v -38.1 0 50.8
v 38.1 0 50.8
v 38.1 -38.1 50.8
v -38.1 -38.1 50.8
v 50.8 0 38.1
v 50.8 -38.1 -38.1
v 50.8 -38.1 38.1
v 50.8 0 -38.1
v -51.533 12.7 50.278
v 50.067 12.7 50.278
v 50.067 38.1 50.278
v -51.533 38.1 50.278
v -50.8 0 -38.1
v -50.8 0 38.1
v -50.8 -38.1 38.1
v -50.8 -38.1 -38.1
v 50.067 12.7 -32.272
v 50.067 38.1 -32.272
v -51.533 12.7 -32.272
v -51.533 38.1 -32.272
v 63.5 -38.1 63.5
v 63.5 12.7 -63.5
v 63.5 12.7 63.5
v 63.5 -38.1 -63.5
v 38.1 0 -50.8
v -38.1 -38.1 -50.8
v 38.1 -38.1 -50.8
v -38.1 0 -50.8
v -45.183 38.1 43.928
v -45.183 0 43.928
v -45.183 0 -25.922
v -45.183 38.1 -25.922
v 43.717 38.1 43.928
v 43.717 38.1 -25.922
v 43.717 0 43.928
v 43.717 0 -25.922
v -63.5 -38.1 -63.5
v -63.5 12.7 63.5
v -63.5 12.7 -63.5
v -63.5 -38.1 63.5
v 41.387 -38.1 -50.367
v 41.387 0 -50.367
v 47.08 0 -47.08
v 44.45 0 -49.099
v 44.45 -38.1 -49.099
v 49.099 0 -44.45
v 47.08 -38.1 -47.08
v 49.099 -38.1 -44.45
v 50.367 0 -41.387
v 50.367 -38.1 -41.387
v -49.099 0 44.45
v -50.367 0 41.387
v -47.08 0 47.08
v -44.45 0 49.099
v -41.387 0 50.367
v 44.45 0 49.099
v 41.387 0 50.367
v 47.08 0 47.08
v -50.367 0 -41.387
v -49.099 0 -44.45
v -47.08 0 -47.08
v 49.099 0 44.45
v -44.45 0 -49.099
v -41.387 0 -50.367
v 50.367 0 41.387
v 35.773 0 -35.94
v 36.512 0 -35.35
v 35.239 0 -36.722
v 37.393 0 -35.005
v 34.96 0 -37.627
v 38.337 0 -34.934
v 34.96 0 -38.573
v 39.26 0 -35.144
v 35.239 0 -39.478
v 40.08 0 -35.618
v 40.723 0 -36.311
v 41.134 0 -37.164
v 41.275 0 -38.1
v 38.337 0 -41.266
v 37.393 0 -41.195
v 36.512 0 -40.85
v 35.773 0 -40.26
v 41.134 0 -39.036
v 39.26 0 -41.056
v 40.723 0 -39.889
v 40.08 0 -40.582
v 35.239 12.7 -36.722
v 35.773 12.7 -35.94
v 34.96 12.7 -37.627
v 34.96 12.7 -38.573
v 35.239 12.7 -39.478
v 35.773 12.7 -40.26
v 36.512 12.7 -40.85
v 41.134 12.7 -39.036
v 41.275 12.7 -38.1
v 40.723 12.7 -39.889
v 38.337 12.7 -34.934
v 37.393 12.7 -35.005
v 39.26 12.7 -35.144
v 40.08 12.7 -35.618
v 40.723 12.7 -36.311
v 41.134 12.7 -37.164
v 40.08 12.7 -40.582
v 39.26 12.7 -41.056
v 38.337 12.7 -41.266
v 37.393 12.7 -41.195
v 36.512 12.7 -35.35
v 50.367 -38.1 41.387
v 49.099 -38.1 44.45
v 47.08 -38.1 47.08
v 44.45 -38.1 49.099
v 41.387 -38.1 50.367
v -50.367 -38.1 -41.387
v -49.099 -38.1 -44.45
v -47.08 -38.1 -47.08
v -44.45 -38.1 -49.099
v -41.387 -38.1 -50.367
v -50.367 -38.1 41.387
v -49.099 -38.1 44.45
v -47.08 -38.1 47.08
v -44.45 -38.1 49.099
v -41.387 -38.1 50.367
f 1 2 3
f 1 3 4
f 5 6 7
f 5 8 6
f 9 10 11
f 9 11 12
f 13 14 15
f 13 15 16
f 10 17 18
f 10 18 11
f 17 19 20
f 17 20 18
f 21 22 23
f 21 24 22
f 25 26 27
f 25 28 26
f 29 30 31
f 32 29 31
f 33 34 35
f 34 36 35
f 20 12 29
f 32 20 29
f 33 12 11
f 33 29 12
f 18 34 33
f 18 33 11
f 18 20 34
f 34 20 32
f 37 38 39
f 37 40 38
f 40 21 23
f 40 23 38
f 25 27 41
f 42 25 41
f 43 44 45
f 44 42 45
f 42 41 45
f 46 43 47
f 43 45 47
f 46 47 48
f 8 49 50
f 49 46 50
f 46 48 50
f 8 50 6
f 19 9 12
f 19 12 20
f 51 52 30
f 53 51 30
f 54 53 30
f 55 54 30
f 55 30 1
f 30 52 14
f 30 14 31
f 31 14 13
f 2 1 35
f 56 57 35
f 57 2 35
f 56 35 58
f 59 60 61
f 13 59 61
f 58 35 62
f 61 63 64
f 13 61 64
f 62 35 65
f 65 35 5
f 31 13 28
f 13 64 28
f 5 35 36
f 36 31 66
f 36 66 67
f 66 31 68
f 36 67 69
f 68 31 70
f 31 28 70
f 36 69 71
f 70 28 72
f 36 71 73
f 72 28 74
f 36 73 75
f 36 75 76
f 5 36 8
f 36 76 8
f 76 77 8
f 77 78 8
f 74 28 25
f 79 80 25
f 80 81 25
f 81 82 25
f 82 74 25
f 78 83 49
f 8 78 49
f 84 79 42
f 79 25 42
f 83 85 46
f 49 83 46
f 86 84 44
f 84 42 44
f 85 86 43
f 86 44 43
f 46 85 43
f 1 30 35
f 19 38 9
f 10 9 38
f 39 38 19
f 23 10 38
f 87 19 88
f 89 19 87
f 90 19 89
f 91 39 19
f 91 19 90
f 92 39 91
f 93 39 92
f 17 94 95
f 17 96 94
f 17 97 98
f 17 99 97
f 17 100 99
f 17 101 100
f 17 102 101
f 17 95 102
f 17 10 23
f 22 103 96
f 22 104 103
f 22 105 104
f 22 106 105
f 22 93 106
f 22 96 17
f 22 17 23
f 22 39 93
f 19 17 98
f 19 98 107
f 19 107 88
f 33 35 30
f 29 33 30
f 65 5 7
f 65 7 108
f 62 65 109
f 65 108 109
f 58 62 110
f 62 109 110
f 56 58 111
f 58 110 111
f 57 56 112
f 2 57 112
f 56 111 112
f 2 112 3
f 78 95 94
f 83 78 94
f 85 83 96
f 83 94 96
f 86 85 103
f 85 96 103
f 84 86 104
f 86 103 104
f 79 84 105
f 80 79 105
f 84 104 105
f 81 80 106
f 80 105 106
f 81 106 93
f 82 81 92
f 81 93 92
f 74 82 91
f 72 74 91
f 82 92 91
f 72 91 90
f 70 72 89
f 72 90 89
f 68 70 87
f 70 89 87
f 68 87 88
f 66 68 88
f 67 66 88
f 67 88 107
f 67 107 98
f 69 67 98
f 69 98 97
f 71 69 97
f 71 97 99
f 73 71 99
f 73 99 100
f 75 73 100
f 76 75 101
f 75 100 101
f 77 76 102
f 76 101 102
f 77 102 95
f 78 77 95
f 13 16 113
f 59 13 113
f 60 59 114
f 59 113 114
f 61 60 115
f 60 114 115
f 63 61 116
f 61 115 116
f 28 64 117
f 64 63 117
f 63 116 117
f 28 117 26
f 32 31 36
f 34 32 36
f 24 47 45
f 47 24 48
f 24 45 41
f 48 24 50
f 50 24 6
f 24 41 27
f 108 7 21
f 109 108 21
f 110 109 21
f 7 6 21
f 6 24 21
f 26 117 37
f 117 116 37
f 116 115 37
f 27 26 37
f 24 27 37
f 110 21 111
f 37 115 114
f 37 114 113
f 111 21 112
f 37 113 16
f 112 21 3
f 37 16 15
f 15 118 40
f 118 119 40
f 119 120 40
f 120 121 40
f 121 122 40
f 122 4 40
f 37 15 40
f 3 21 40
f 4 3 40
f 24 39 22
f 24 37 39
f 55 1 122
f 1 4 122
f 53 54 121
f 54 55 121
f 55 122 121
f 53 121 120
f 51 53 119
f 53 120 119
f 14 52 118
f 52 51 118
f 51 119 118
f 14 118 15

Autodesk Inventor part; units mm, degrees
ref_plane "YZ Plane" through (0, 0, 0) normal (1, 0, 0) x (0, 1, 0)
ref_plane "XZ Plane" through (0, 0, 0) normal (0, 1, 0) x (-1, 0, 0)
ref_plane "XY Plane" through (0, 0, 0) normal (0, 0, 1) x (1, 0, 0)
sketch "Sketch1" plane through (0, 0, 0) normal (0, 1, 0) x (-1, 0, 0)
  line L0 (-50.8, 50.8) -> (50.8, 50.8)
  line L1 (50.8, 50.8) -> (50.8, -50.8)
  line L2 (50.8, -50.8) -> (-50.8, -50.8)
  line L3 (-50.8, -50.8) -> (-50.8, 50.8)
  line L4 (-63.5, 63.5) -> (63.5, 63.5)
  line L5 (63.5, 63.5) -> (63.5, -63.5)
  line L6 (63.5, -63.5) -> (-63.5, -63.5)
  line L7 (-63.5, -63.5) -> (-63.5, 63.5)
  point P0 (0, 0)
  dimension "d0" = 101.6
  dimension "d1" = 101.6
  dimension "d2" = 127
  dimension "d3" = 127
  dimension "d4" = 63.5
  dimension "d5" = 63.5
  dimension "d6" = 50.8
  dimension "d7" = 50.8
extrude "Extrusion1" add sketch "Sketch1" against normal blind 38.1
fillet "Fillet1" radius 12.7 4 edges at (-50.8, -19.05, -50.8) (50.8, -19.05, -50.8) (-50.8, -19.05, 50.8) (50.8, -19.05, 50.8)
sketch "Sketch3" plane through (0, 0, 0) normal (0, 1, 0) x (1, 0, 0)
  line L0 (-63.5, 63.5) -> (63.5, 63.5)
  line L1 (63.5, 63.5) -> (63.5, -63.5)
  line L2 (63.5, -63.5) -> (-63.5, -63.5)
  line L3 (-63.5, -63.5) -> (-63.5, 63.5)
  point P0 (0, 0)
extrude "Extrusion2" add sketch "Sketch3" along normal blind 12.7
sketch "Sketch4" plane through (0, 12.7, 0) normal (0, 1, 0) x (1, 0, 0)
  line L0 (63.5, -63.5) -> (63.5, 63.5) projected
  line L1 (63.5, 63.5) -> (-63.5, 63.5) projected
  circle A0 centre (38.1, 38.1) radius 3.175
  circle A1 centre (-69.85, 38.1) radius 3.175
  circle A2 centre (38.1, -69.85) radius 3.175
  circle A3 centre (-69.85, -69.85) radius 3.175
  point P0 (0, 0)
  dimension "d13" = 6.35
  dimension "d14" = 25.4
  dimension "d15" = 25.4
  dimension "d18" = 107.95
  dimension "d21" = 107.95
extrude "Extrusion3" cut sketch "Sketch4" against normal up to next
sketch "Sketch5" plane through (0, 12.7, 0) normal (0, 1, 0) x (1, 0, 0)
  circle A0 centre (50.8, -57.15) radius 3.175 projected
  circle A1 centre (38.1, 38.1) radius 3.175 projected
  circle A2 centre (-57.15, 50.8) radius 3.175 projected
  circle A3 centre (-57.15, -57.15) radius 3.175 projected
  circle A4 centre (-57.15, -57.15) radius 6.35
  circle A5 centre (-57.15, 50.8) radius 6.35
  circle A6 centre (38.1, 38.1) radius 6.35
  circle A7 centre (50.8, -57.15) radius 6.35
  point P0 (0, 0)
  dimension "d26" = 12.7
  dimension "d27" = 12.7
  dimension "d28" = 12.7
  dimension "d29" = 12.7
extrude "Extrusion4" [suppressed]
sketch "Sketch6" plane through (0, 12.7, 0) normal (0, 1, 0) x (1, 0, 0)
  line L0 (-45.1827, 25.9215) -> (43.7173, 25.9215)
  line L1 (43.7173, 25.9215) -> (43.7173, -43.9285)
  line L2 (43.7173, -43.9285) -> (-45.1827, -43.9285)
  line L3 (-45.1827, -43.9285) -> (-45.1827, 25.9215)
  line L4 (-51.5327, 32.2715) -> (50.0673, 32.2715)
  line L5 (50.0673, 32.2715) -> (50.0673, -50.2785)
  line L6 (50.0673, -50.2785) -> (-51.5327, -50.2785)
  line L7 (-51.5327, -50.2785) -> (-51.5327, 32.2715)
  point P0 (0, 0)
  dimension "d32" = 69.85
  dimension "d33" = 88.9
  dimension "d36" = 6.35
  dimension "d37" = 6.35
  dimension "d38" = 6.35
  dimension "d39" = 6.35
extrude "Extrusion5" add sketch "Sketch6" along normal blind 25.4
sketch "Sketch7" plane through (0, 12.7, 0) normal (0, 1, 0) x (1, 0, 0)
  line L0 (43.7173, -43.9285) -> (43.7173, 25.9215) projected
  line L1 (43.7173, 25.9215) -> (-45.1827, 25.9215) projected
  line L2 (-45.1827, 25.9215) -> (43.7173, 25.9215)
  line L3 (43.7173, 25.9215) -> (43.7173, -43.9285)
  line L4 (43.7173, -43.9285) -> (-45.1827, -43.9285)
  line L5 (-45.1827, -43.9285) -> (-45.1827, 25.9215)
  point P0 (0, 0)
  point P1 (63.5839, -35.7281)
  point P2 (63.5, 18.4248)
extrude "Extrusion6" cut sketch "Sketch7" against normal up to next
properties part number "Case1"
